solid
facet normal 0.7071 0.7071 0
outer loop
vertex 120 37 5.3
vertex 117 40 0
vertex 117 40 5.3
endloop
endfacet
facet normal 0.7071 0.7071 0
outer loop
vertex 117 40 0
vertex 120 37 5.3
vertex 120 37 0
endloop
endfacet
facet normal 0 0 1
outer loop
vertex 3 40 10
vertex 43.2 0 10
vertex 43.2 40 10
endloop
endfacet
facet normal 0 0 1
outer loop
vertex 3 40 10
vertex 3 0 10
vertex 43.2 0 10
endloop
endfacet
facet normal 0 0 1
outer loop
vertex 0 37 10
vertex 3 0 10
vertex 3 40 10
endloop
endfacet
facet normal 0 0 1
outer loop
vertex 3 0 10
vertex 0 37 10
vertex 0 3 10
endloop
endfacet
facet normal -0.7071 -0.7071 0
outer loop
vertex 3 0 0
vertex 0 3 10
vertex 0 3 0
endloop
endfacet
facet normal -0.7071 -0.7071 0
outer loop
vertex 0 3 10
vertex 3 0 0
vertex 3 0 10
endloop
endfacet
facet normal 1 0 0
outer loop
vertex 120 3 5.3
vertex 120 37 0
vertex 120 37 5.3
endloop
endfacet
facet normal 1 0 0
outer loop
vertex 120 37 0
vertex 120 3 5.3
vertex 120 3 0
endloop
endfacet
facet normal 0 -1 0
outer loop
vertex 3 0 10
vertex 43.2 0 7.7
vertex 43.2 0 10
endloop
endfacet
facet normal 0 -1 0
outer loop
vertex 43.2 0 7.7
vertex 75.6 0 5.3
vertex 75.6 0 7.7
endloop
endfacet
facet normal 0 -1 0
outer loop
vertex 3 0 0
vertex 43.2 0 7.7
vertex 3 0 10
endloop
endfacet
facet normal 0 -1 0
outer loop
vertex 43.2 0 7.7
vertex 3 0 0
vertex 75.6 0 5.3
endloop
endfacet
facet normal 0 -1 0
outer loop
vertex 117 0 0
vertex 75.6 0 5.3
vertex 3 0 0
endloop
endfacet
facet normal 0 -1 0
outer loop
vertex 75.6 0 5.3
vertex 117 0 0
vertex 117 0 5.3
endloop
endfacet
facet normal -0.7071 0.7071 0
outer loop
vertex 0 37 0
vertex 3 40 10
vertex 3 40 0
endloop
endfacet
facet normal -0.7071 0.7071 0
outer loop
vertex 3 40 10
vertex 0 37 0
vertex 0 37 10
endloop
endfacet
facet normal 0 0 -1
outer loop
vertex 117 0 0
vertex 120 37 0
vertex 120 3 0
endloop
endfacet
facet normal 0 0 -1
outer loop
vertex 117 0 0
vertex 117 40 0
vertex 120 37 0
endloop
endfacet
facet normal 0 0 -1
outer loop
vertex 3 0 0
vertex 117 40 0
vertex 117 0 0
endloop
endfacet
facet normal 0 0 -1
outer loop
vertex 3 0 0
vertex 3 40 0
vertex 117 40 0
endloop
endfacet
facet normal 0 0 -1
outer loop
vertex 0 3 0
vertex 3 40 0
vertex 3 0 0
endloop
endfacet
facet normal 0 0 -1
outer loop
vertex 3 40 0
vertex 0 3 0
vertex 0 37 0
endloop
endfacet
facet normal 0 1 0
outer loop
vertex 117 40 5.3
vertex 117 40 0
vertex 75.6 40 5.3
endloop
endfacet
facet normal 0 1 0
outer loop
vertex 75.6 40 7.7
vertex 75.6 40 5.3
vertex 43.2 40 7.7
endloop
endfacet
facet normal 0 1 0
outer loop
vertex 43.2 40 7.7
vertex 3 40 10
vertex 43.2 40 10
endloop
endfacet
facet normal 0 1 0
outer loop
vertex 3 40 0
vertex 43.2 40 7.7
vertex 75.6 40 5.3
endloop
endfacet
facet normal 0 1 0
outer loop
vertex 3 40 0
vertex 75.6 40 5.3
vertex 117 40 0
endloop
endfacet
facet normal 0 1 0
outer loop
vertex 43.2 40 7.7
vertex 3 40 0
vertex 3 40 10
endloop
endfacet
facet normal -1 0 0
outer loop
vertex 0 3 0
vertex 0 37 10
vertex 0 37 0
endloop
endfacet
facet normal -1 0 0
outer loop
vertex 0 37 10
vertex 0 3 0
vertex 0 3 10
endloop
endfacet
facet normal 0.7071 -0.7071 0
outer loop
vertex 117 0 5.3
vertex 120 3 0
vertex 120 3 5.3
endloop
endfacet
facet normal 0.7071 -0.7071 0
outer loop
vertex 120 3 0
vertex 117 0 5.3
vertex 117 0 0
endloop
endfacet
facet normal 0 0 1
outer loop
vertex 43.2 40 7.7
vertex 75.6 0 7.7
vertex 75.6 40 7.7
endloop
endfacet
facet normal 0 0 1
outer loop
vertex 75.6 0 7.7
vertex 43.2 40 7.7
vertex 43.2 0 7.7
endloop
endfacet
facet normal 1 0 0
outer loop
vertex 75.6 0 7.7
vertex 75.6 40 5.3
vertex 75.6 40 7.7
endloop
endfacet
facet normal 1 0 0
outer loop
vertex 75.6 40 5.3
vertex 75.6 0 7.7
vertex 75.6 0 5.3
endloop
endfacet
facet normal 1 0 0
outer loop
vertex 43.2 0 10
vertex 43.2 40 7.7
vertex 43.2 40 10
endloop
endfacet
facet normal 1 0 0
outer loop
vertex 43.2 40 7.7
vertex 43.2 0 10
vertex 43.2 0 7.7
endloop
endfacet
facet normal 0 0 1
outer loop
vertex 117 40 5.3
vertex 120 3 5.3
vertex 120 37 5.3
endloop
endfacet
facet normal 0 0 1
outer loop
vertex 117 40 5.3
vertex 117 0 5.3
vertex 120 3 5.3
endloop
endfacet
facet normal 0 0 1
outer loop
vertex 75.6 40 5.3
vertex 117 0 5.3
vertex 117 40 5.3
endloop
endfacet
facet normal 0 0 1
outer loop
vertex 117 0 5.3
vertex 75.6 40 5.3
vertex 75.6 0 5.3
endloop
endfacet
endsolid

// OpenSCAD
$fn = 32;

// ----------------------------------------------------------------------
// Stepped bar: twostep, 120 x 40 x 10/5.3 mm
// ----------------------------------------------------------------------

// --- parameters (mm) ---
bar_l = 120;              // bar length, X
bar_w = 40;               // bar width, Y
plate_t = 10;             // thickness of the thick zone, Z
thin_t = 5.3;             // thickness of the thin zone
corner_c = 3;             // corner chamfer of the bar
step_cut = 4.7;           // material removed from the thin zone
stair1_x = 43.2;          // position of the first stair
stair2_x = 75.6;          // position of the second stair
mid_t = 7.7;              // thickness of the middle zone
depth_1 = 2.3;            // depth of cut 1 from the top face
depth_2 = 4.7;            // depth of cut 2 from the top face
fit_tol = 0.05;           // declared fit tolerance (prompt contract)
free_tol = 0.2;           // declared free tolerance (prompt contract)

profile = [[3, 0], [117, 0], [120, 3], [120, 37], [117, 40], [3, 40], [0, 37], [0, 3]];  // primary outline, 8 points, counter clockwise
void_1 = [[43.2, -1], [75.6, -1], [75.6, 41], [43.2, 41]];  // first stair, 4 points
void_2 = [[75.6, -1], [121, -1], [121, 41], [75.6, 41]];  // second stair, 4 points

// --- the one profile operation ---
difference() {
  linear_extrude(height = plate_t) polygon(points = profile);
  translate([0, 0, plate_t - depth_1])
    linear_extrude(height = depth_1 + 1) polygon(points = void_1);
  translate([0, 0, plate_t - depth_2])
    linear_extrude(height = depth_2 + 1) polygon(points = void_2);
}
